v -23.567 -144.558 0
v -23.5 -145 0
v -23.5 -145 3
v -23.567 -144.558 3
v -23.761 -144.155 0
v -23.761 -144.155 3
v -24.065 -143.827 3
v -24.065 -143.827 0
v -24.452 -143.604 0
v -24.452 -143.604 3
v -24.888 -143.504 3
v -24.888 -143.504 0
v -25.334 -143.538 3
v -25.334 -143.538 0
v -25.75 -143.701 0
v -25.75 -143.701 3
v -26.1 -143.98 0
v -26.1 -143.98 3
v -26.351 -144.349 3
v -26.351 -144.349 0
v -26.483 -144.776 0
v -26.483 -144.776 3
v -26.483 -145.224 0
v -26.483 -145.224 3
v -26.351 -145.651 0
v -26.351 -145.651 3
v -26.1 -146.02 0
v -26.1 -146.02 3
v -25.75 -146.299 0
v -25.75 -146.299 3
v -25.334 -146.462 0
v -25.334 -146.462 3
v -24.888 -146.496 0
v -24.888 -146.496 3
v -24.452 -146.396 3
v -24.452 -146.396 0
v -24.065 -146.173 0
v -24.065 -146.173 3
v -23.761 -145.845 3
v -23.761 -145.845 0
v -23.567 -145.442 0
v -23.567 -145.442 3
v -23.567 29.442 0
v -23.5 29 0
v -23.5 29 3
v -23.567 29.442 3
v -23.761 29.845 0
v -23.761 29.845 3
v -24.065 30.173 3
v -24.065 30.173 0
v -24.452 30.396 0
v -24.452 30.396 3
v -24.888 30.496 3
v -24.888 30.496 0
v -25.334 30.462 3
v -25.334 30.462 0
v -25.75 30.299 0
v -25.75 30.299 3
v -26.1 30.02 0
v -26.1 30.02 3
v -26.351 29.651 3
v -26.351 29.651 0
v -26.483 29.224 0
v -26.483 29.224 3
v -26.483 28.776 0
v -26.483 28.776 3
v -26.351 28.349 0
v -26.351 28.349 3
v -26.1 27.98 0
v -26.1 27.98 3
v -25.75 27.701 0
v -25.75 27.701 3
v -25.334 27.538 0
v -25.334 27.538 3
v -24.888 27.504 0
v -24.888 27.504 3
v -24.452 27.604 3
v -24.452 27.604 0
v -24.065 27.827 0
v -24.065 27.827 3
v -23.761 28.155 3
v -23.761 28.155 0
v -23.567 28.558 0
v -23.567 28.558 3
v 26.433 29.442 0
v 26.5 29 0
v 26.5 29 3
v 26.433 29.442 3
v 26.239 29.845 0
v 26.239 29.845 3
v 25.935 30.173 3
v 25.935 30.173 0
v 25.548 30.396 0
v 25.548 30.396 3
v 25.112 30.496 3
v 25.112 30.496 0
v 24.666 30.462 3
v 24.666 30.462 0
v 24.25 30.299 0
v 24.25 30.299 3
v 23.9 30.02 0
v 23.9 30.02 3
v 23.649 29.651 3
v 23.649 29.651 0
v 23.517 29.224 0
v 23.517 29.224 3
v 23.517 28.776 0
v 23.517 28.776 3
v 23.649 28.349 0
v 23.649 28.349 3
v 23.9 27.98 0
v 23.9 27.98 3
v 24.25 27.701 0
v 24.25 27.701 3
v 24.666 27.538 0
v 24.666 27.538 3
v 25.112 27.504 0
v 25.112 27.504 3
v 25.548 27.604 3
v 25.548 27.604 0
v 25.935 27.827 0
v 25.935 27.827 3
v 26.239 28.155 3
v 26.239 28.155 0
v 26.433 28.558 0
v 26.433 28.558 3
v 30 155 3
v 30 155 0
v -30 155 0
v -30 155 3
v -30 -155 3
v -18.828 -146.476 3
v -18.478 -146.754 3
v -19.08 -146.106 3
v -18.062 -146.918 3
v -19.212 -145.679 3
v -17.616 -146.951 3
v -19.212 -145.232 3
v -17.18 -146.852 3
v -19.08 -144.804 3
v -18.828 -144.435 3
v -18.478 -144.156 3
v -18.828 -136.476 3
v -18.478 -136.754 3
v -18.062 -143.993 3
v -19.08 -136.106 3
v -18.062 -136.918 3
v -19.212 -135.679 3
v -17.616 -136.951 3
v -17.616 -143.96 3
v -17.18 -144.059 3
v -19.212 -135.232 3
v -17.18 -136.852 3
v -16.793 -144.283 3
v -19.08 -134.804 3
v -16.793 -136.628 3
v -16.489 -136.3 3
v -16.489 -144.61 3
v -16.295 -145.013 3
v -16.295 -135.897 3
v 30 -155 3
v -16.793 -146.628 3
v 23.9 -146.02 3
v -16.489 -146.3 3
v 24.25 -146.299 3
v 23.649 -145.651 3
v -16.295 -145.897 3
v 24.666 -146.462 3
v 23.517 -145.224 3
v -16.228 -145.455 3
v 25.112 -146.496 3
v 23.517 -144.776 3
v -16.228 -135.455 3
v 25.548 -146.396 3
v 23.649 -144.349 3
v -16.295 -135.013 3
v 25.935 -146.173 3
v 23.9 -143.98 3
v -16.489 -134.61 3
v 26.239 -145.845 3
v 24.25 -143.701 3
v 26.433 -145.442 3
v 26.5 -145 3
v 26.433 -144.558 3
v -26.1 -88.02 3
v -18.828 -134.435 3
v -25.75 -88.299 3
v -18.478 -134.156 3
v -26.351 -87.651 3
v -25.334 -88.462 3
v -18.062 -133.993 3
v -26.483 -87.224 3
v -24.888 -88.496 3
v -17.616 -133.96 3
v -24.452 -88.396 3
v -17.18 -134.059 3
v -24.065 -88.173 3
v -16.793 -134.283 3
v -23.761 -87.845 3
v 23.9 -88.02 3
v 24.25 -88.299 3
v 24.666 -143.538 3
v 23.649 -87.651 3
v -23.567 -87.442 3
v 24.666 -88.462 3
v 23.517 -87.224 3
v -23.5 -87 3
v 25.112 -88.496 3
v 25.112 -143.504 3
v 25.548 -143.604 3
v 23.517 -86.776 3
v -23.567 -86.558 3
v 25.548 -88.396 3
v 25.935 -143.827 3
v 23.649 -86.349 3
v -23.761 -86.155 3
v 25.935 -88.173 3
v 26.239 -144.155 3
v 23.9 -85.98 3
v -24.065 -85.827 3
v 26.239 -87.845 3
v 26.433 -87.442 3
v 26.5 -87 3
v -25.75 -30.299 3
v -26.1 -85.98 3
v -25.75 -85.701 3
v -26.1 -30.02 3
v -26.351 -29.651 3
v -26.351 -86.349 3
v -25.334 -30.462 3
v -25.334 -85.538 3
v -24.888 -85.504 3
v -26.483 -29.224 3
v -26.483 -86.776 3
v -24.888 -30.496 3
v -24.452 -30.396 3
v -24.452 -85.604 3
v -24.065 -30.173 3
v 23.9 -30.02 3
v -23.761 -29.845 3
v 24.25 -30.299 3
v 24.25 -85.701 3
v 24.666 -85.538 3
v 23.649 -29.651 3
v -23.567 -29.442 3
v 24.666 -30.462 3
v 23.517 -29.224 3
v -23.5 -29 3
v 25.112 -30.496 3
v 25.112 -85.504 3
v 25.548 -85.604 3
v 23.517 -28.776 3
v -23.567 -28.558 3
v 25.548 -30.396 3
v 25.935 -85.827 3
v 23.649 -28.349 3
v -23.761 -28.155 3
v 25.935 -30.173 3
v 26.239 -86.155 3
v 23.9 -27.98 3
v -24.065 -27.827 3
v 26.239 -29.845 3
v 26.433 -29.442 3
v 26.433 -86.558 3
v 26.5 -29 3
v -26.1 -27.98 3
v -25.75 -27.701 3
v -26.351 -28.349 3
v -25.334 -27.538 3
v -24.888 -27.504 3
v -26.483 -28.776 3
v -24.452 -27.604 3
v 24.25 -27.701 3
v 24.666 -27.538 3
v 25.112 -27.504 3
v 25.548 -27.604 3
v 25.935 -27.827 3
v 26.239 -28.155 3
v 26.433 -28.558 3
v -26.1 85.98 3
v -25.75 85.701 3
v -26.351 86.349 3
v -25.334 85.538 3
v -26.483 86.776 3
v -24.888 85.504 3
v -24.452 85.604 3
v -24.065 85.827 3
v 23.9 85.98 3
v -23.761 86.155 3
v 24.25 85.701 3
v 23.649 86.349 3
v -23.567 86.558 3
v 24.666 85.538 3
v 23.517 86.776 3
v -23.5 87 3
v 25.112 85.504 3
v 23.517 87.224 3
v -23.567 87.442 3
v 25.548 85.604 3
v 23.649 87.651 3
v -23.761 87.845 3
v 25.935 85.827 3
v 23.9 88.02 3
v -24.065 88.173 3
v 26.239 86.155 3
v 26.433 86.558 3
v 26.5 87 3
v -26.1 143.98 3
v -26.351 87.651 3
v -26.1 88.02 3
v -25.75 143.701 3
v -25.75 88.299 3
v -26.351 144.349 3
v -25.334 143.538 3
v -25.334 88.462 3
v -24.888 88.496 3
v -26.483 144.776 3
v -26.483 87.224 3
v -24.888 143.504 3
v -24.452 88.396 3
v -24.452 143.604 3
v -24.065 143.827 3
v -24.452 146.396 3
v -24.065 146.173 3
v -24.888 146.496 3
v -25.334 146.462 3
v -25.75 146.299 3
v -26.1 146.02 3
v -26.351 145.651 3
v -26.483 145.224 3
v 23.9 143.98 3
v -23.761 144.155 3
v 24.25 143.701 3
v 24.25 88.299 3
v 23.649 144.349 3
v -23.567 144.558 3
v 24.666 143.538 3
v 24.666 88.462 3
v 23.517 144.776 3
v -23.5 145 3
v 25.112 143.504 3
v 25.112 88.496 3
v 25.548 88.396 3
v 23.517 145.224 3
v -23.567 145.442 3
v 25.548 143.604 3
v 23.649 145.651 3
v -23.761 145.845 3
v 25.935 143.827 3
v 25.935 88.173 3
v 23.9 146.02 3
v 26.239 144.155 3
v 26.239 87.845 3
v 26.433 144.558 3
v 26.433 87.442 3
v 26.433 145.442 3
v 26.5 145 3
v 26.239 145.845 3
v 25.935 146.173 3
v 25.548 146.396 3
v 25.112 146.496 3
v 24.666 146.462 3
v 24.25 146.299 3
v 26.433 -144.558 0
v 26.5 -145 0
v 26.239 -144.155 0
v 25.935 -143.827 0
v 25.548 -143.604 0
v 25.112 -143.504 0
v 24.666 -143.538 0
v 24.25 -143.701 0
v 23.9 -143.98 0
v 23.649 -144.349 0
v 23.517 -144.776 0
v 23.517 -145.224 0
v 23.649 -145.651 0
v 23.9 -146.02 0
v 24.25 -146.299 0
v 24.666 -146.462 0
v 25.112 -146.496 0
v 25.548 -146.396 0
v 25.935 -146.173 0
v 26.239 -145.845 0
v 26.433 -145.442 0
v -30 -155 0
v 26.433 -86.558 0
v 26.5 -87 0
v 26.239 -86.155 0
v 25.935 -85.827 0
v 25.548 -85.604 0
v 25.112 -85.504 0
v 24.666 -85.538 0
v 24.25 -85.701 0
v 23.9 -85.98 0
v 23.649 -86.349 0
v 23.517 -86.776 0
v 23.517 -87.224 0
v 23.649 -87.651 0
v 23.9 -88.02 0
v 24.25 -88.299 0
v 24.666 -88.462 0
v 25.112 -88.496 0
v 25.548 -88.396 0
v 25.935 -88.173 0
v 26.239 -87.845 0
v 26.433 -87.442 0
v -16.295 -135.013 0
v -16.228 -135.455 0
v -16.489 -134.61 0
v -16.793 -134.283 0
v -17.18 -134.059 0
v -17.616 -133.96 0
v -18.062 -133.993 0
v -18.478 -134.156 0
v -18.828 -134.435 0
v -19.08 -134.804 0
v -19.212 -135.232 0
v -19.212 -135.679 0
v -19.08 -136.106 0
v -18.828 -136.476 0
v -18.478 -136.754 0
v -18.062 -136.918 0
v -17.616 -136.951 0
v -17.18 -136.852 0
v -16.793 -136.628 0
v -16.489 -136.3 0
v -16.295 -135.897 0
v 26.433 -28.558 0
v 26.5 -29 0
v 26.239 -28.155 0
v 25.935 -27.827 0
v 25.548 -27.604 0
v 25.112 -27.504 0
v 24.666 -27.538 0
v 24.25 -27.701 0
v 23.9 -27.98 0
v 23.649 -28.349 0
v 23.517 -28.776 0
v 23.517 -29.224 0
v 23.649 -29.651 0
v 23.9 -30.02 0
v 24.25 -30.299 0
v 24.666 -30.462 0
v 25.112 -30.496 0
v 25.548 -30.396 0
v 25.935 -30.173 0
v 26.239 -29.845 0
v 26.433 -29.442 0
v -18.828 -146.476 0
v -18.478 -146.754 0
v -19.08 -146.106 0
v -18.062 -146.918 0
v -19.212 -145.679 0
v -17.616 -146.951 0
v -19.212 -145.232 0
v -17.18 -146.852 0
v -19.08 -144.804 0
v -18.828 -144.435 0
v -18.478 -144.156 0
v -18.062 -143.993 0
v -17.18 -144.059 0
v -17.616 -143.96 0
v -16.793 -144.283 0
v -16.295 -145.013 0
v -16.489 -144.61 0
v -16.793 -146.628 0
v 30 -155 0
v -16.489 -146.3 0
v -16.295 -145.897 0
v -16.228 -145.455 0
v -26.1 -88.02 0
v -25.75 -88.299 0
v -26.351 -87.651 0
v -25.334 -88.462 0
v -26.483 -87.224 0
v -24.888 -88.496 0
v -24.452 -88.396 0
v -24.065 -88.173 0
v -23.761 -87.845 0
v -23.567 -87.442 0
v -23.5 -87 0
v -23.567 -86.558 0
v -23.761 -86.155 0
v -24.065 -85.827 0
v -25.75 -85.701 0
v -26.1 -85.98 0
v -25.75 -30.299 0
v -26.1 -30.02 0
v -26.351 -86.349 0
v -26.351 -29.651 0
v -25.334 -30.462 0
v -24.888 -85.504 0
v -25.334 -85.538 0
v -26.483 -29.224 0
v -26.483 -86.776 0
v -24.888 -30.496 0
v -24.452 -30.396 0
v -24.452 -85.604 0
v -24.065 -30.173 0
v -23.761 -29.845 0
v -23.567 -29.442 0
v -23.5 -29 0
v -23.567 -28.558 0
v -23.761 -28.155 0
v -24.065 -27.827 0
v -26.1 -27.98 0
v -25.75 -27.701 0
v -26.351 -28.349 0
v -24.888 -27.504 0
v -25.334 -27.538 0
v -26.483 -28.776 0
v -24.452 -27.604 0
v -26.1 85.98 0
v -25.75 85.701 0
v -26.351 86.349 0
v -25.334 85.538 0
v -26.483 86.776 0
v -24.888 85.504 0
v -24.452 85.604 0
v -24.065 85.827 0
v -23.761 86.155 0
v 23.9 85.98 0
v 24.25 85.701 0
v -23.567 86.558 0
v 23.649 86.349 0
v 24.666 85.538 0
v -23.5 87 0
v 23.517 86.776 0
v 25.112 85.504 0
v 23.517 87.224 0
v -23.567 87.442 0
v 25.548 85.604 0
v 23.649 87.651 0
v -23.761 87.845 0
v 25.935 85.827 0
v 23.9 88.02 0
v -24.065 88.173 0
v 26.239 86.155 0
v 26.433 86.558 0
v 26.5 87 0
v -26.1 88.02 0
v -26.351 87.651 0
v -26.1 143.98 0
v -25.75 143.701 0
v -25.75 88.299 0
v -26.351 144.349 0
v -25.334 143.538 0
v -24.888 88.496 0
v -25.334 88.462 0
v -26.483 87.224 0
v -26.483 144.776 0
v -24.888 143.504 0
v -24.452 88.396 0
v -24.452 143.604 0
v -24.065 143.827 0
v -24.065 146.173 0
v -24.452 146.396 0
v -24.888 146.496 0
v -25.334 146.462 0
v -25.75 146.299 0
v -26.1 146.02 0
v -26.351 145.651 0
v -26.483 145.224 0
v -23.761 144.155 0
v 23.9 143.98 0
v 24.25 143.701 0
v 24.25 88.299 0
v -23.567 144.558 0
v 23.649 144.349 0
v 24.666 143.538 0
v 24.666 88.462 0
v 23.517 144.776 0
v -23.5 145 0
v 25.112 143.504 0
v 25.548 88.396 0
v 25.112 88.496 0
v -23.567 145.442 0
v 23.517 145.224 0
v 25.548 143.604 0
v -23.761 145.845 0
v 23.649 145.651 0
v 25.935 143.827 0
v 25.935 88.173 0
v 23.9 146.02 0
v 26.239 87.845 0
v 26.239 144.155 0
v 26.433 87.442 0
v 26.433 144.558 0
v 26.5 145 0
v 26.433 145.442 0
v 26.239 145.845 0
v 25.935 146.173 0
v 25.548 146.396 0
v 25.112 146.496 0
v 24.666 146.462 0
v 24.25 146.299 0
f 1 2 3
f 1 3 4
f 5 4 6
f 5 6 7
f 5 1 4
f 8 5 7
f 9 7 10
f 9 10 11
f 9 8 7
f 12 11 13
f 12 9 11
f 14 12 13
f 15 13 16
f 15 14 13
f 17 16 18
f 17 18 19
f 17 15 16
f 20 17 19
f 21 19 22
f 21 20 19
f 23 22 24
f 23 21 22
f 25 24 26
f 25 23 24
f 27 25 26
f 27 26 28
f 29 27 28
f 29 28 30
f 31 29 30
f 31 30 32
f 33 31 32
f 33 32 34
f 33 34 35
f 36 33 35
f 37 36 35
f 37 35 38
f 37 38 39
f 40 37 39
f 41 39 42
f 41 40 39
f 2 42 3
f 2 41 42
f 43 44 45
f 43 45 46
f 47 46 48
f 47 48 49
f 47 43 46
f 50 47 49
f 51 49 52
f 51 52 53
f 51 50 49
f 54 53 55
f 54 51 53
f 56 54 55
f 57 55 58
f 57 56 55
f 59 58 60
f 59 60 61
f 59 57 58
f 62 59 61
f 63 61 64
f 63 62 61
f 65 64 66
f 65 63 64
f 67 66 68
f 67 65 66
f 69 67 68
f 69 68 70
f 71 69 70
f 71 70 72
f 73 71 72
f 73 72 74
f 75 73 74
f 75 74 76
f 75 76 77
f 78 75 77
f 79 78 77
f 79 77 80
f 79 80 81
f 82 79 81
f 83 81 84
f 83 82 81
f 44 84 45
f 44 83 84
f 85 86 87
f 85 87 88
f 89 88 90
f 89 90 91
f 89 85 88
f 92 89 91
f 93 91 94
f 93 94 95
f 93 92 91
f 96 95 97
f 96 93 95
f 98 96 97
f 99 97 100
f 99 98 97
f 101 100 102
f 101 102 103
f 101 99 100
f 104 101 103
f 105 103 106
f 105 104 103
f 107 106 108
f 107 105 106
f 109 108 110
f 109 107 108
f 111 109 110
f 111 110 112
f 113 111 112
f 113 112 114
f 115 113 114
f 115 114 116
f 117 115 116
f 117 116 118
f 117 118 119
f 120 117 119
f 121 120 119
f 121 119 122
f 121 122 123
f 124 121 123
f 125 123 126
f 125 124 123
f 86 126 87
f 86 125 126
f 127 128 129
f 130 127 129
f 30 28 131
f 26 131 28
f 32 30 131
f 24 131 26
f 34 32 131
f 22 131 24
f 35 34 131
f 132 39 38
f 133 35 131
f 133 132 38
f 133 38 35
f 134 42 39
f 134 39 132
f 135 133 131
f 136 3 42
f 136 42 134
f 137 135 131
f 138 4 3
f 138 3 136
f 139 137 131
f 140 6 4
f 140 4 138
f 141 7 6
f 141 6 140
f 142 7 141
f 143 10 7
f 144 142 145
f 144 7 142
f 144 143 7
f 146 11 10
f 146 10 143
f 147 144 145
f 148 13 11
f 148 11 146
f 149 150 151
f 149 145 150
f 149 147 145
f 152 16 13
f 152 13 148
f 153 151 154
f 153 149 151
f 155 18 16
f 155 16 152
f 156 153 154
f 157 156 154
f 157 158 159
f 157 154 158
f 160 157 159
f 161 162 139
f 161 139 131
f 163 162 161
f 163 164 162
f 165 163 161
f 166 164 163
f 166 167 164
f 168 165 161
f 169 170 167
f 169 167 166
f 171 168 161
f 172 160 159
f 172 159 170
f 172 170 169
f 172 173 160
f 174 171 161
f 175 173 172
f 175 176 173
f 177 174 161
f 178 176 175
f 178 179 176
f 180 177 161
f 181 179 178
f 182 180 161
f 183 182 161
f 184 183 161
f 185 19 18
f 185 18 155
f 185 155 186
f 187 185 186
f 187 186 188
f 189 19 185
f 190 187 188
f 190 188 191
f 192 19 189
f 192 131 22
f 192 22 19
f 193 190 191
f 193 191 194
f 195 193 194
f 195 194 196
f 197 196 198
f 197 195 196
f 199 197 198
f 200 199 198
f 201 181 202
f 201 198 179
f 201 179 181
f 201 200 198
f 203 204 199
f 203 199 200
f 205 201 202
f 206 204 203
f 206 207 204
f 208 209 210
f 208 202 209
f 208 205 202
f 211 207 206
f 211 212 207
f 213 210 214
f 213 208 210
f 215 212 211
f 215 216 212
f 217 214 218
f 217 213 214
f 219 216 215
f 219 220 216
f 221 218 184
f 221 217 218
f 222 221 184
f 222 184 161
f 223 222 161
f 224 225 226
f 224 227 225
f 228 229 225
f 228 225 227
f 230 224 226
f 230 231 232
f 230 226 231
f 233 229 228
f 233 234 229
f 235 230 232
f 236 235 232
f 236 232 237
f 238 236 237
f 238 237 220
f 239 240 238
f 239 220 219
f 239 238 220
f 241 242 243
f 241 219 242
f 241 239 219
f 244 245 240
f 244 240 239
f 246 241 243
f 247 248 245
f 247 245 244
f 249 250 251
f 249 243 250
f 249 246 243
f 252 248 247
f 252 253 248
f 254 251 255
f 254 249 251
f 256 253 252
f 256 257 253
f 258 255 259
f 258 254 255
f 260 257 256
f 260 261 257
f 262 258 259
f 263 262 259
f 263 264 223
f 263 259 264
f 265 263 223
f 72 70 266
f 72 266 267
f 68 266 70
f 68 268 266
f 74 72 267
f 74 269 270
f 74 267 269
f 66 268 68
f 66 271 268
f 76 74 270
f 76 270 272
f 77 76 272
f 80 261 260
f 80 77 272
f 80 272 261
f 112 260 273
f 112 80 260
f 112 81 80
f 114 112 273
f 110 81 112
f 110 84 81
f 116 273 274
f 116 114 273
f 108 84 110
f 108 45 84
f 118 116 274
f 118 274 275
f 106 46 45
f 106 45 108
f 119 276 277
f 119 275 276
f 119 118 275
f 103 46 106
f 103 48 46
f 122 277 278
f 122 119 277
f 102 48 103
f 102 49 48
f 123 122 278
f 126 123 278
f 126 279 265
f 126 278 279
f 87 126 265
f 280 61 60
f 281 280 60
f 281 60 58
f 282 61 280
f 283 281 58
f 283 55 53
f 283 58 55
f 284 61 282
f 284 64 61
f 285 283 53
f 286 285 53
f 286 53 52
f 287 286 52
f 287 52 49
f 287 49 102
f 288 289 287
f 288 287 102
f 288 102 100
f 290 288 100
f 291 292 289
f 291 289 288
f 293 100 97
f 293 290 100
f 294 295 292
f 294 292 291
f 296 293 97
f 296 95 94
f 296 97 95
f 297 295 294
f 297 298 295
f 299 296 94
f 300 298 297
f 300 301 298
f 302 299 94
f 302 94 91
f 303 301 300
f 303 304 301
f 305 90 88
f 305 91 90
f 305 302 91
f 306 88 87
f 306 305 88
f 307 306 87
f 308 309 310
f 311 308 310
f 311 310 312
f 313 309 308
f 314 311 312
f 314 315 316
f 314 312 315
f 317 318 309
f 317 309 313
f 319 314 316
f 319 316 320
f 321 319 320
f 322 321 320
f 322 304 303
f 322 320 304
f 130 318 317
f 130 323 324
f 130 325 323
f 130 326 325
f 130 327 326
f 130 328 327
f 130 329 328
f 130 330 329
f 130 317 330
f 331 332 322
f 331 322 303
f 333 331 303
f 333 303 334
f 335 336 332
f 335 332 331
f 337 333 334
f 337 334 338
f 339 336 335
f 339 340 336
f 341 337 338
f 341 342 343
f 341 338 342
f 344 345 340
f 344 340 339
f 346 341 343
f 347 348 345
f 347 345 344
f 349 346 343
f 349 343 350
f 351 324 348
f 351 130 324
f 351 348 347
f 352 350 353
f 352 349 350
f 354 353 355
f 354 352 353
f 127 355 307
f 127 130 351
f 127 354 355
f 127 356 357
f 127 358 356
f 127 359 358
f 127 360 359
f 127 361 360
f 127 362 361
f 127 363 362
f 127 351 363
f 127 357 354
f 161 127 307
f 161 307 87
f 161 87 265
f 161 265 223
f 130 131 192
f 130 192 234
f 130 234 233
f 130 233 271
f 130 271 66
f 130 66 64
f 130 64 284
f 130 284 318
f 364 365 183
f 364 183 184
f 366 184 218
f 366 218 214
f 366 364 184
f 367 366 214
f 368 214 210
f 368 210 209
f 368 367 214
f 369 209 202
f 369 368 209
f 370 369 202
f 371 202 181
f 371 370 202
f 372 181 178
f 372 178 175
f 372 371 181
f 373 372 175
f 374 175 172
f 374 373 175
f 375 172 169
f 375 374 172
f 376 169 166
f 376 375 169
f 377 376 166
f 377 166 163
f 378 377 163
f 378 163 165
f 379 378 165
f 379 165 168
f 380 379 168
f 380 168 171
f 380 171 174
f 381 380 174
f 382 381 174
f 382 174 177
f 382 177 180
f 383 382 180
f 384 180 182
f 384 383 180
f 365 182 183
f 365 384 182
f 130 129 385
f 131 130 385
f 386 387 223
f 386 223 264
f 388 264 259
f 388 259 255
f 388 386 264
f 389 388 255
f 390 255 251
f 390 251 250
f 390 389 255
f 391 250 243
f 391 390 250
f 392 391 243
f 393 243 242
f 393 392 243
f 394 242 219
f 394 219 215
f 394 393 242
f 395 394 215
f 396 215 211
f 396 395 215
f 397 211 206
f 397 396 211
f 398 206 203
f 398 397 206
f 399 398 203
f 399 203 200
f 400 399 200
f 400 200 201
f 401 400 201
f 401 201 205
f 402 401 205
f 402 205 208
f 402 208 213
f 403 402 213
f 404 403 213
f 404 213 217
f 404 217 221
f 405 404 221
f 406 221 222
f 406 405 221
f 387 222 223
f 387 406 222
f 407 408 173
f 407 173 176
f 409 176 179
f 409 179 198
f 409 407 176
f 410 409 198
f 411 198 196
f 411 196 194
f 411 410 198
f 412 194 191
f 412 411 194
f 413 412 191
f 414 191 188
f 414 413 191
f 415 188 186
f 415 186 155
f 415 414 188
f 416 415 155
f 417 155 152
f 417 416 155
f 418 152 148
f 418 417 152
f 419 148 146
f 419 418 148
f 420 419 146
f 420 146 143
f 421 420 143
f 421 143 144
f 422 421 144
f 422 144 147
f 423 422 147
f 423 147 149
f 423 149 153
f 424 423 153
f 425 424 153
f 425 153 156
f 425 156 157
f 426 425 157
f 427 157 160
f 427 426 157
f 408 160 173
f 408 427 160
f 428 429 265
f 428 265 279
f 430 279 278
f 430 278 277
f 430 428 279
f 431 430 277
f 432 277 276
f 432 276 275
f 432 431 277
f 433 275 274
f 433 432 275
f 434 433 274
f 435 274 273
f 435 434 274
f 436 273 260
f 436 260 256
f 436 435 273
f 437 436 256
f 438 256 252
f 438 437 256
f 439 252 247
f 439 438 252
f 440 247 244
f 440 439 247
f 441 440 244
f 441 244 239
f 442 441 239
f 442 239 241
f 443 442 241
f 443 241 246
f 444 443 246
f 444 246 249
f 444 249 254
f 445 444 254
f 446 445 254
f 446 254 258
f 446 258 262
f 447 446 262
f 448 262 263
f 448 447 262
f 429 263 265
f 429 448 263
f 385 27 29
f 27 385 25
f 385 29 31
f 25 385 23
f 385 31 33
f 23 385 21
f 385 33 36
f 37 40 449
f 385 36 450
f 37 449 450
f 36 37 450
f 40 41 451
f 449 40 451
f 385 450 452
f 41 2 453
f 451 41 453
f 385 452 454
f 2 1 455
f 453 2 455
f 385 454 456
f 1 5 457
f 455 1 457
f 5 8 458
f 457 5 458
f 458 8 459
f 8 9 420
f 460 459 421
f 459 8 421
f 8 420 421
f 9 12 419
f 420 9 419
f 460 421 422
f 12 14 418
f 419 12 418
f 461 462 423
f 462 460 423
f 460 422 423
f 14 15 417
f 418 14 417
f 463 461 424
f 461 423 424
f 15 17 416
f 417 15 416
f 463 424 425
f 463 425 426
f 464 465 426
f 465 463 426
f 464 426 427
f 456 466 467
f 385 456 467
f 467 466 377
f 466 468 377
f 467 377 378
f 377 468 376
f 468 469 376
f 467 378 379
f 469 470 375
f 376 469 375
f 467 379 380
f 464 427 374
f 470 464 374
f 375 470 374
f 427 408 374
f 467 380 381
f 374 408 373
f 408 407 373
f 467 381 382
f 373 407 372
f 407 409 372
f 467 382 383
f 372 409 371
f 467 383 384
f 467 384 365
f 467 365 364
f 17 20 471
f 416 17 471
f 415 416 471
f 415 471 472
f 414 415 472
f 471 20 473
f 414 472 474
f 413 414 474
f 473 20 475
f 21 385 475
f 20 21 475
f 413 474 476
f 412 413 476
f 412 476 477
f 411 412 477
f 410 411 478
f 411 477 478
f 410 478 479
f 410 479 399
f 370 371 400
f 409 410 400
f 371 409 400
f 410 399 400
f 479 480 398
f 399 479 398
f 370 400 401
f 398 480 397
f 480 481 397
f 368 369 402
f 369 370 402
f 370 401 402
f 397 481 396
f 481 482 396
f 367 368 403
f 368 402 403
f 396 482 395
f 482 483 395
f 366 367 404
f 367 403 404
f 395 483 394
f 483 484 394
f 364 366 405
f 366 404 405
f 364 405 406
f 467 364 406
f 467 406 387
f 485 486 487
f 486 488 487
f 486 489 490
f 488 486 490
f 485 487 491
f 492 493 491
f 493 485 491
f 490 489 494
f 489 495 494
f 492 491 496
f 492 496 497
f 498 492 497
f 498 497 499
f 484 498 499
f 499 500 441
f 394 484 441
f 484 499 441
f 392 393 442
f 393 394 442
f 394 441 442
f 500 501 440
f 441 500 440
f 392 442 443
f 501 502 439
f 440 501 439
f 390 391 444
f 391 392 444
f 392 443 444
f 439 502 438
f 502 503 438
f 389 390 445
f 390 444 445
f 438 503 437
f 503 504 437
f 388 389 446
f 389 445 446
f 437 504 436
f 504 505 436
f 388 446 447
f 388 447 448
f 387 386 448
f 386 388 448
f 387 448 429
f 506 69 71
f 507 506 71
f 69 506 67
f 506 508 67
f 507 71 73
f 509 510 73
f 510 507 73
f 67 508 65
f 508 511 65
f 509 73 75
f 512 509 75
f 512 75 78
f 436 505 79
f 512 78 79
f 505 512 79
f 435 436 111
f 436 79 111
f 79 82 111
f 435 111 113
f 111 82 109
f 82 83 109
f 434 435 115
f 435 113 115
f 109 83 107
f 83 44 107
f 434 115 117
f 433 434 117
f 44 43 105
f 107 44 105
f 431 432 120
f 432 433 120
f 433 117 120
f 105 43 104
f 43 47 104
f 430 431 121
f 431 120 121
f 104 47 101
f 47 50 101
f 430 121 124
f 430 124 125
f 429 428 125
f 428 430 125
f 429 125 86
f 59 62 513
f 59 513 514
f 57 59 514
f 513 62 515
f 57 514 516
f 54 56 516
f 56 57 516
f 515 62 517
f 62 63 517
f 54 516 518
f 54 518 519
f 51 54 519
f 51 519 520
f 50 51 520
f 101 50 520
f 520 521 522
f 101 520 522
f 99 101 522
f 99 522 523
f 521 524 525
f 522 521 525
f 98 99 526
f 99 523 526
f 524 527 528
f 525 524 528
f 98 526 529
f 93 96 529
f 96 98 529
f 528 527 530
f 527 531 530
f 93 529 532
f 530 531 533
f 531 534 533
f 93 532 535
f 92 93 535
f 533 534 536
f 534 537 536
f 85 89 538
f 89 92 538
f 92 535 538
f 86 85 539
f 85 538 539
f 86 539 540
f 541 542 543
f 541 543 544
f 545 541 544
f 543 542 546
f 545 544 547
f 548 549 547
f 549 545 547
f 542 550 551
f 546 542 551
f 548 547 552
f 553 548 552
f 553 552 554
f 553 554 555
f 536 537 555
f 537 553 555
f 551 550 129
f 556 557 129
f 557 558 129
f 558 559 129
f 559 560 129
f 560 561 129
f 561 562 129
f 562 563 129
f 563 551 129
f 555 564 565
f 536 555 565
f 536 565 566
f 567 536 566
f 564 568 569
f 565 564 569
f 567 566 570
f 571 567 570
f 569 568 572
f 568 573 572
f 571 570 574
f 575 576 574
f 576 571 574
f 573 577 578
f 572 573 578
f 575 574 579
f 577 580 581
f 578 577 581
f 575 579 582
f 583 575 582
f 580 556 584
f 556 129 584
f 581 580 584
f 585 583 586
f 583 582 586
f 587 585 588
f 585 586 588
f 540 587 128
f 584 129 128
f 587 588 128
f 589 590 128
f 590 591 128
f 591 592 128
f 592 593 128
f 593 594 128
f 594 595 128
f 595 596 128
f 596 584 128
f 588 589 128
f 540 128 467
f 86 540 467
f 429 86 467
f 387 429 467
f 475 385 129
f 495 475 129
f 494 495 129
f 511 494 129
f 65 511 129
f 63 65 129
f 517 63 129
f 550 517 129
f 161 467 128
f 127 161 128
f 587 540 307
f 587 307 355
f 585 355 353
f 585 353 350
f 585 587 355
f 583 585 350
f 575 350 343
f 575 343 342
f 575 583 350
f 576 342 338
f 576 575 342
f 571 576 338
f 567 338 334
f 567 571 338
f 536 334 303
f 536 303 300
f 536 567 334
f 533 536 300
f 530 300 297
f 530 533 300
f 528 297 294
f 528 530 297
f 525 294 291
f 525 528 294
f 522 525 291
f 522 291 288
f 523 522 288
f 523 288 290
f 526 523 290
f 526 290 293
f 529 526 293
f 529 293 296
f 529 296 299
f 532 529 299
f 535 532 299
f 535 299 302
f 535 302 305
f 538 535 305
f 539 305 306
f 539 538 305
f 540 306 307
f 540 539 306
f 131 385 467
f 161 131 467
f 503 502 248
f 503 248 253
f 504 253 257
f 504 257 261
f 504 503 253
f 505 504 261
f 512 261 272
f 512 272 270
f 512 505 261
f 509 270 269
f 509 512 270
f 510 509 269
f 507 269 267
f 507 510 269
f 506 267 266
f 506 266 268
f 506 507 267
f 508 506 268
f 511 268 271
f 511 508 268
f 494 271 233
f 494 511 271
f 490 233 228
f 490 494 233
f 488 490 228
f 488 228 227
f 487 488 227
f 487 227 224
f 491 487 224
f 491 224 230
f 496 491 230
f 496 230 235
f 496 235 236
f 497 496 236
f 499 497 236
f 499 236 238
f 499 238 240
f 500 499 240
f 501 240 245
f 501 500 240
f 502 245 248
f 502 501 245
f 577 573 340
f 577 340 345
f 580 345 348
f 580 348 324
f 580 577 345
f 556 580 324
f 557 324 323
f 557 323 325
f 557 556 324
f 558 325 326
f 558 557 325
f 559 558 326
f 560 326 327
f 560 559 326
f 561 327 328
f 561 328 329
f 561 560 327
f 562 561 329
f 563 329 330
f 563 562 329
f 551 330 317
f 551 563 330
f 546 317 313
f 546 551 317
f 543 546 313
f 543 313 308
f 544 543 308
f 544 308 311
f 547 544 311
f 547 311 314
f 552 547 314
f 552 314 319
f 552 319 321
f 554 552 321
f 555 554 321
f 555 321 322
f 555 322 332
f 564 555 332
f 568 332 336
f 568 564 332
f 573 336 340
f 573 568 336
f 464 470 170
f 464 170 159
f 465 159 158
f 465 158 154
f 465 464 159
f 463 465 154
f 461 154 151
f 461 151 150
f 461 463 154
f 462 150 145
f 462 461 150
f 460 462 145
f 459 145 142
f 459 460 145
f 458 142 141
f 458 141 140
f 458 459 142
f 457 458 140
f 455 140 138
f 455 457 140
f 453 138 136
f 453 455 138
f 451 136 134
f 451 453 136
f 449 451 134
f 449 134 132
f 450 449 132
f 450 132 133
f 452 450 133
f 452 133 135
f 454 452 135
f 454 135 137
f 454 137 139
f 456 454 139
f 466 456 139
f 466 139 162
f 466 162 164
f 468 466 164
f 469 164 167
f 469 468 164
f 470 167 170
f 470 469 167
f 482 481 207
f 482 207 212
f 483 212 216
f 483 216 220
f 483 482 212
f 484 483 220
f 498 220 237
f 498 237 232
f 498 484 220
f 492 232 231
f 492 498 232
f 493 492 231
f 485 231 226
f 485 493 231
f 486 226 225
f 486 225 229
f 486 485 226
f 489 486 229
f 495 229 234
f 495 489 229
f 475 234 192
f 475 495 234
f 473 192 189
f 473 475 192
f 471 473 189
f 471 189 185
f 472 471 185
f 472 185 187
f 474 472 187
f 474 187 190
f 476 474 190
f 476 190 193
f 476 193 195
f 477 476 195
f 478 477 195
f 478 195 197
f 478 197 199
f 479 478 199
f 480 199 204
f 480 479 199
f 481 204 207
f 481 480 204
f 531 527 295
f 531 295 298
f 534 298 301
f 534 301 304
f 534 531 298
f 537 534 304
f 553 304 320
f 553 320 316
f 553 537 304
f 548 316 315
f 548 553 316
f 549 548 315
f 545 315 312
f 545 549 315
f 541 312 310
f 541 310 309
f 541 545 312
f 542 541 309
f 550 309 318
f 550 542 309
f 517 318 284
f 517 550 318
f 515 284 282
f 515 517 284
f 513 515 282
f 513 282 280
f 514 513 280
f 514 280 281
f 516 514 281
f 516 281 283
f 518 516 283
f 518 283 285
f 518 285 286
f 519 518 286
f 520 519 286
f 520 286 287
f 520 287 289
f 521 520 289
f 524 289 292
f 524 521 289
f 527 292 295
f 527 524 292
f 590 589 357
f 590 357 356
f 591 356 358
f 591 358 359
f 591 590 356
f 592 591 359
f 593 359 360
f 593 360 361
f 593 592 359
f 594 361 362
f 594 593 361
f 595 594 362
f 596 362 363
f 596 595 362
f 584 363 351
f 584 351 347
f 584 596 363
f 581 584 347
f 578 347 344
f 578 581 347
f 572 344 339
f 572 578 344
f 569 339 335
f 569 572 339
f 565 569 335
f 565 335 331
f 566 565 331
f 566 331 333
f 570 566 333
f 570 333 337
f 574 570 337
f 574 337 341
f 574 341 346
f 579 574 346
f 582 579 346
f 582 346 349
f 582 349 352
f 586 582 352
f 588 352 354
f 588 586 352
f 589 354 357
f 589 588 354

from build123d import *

# Parameters (mm, degrees)
ESQUISSE1_R        = 1.5
BOSS_EXTRU_1_DEPTH = 3


with BuildPart() as part:
    # Esquisse1 → Boss.-Extru.1 (new body)
    with BuildSketch(Plane.XY):
        Polygon((-20, -155), (30, -155), (30, 155), (-20, 155), (-30, 155), (-30, 150), (-30, -150), (-30, -155), align=None)
        with Locations((-25, -145)):
            Circle(ESQUISSE1_R, mode=Mode.SUBTRACT)
        with Locations((-17.728308863, -145.455320997)):
            Circle(ESQUISSE1_R, mode=Mode.SUBTRACT)
        with Locations((-17.728308863, -135.455320997)):
            Circle(ESQUISSE1_R, mode=Mode.SUBTRACT)
        with Locations((-25, -87)):
            Circle(ESQUISSE1_R, mode=Mode.SUBTRACT)
        with Locations((-25, -29)):
            Circle(ESQUISSE1_R, mode=Mode.SUBTRACT)
        with Locations((25, -145)):
            Circle(ESQUISSE1_R, mode=Mode.SUBTRACT)
        with Locations((25, -87)):
            Circle(ESQUISSE1_R, mode=Mode.SUBTRACT)
        with Locations((25, -29)):
            Circle(ESQUISSE1_R, mode=Mode.SUBTRACT)
        with Locations((-25, 29)):
            Circle(ESQUISSE1_R, mode=Mode.SUBTRACT)
        with Locations((-25, 87)):
            Circle(ESQUISSE1_R, mode=Mode.SUBTRACT)
        with Locations((-25, 145)):
            Circle(ESQUISSE1_R, mode=Mode.SUBTRACT)
        with Locations((25, 29)):
            Circle(ESQUISSE1_R, mode=Mode.SUBTRACT)
        with Locations((25, 87)):
            Circle(ESQUISSE1_R, mode=Mode.SUBTRACT)
        with Locations((25, 145)):
            Circle(ESQUISSE1_R, mode=Mode.SUBTRACT)
    extrude(amount=BOSS_EXTRU_1_DEPTH)


solid = part.part
